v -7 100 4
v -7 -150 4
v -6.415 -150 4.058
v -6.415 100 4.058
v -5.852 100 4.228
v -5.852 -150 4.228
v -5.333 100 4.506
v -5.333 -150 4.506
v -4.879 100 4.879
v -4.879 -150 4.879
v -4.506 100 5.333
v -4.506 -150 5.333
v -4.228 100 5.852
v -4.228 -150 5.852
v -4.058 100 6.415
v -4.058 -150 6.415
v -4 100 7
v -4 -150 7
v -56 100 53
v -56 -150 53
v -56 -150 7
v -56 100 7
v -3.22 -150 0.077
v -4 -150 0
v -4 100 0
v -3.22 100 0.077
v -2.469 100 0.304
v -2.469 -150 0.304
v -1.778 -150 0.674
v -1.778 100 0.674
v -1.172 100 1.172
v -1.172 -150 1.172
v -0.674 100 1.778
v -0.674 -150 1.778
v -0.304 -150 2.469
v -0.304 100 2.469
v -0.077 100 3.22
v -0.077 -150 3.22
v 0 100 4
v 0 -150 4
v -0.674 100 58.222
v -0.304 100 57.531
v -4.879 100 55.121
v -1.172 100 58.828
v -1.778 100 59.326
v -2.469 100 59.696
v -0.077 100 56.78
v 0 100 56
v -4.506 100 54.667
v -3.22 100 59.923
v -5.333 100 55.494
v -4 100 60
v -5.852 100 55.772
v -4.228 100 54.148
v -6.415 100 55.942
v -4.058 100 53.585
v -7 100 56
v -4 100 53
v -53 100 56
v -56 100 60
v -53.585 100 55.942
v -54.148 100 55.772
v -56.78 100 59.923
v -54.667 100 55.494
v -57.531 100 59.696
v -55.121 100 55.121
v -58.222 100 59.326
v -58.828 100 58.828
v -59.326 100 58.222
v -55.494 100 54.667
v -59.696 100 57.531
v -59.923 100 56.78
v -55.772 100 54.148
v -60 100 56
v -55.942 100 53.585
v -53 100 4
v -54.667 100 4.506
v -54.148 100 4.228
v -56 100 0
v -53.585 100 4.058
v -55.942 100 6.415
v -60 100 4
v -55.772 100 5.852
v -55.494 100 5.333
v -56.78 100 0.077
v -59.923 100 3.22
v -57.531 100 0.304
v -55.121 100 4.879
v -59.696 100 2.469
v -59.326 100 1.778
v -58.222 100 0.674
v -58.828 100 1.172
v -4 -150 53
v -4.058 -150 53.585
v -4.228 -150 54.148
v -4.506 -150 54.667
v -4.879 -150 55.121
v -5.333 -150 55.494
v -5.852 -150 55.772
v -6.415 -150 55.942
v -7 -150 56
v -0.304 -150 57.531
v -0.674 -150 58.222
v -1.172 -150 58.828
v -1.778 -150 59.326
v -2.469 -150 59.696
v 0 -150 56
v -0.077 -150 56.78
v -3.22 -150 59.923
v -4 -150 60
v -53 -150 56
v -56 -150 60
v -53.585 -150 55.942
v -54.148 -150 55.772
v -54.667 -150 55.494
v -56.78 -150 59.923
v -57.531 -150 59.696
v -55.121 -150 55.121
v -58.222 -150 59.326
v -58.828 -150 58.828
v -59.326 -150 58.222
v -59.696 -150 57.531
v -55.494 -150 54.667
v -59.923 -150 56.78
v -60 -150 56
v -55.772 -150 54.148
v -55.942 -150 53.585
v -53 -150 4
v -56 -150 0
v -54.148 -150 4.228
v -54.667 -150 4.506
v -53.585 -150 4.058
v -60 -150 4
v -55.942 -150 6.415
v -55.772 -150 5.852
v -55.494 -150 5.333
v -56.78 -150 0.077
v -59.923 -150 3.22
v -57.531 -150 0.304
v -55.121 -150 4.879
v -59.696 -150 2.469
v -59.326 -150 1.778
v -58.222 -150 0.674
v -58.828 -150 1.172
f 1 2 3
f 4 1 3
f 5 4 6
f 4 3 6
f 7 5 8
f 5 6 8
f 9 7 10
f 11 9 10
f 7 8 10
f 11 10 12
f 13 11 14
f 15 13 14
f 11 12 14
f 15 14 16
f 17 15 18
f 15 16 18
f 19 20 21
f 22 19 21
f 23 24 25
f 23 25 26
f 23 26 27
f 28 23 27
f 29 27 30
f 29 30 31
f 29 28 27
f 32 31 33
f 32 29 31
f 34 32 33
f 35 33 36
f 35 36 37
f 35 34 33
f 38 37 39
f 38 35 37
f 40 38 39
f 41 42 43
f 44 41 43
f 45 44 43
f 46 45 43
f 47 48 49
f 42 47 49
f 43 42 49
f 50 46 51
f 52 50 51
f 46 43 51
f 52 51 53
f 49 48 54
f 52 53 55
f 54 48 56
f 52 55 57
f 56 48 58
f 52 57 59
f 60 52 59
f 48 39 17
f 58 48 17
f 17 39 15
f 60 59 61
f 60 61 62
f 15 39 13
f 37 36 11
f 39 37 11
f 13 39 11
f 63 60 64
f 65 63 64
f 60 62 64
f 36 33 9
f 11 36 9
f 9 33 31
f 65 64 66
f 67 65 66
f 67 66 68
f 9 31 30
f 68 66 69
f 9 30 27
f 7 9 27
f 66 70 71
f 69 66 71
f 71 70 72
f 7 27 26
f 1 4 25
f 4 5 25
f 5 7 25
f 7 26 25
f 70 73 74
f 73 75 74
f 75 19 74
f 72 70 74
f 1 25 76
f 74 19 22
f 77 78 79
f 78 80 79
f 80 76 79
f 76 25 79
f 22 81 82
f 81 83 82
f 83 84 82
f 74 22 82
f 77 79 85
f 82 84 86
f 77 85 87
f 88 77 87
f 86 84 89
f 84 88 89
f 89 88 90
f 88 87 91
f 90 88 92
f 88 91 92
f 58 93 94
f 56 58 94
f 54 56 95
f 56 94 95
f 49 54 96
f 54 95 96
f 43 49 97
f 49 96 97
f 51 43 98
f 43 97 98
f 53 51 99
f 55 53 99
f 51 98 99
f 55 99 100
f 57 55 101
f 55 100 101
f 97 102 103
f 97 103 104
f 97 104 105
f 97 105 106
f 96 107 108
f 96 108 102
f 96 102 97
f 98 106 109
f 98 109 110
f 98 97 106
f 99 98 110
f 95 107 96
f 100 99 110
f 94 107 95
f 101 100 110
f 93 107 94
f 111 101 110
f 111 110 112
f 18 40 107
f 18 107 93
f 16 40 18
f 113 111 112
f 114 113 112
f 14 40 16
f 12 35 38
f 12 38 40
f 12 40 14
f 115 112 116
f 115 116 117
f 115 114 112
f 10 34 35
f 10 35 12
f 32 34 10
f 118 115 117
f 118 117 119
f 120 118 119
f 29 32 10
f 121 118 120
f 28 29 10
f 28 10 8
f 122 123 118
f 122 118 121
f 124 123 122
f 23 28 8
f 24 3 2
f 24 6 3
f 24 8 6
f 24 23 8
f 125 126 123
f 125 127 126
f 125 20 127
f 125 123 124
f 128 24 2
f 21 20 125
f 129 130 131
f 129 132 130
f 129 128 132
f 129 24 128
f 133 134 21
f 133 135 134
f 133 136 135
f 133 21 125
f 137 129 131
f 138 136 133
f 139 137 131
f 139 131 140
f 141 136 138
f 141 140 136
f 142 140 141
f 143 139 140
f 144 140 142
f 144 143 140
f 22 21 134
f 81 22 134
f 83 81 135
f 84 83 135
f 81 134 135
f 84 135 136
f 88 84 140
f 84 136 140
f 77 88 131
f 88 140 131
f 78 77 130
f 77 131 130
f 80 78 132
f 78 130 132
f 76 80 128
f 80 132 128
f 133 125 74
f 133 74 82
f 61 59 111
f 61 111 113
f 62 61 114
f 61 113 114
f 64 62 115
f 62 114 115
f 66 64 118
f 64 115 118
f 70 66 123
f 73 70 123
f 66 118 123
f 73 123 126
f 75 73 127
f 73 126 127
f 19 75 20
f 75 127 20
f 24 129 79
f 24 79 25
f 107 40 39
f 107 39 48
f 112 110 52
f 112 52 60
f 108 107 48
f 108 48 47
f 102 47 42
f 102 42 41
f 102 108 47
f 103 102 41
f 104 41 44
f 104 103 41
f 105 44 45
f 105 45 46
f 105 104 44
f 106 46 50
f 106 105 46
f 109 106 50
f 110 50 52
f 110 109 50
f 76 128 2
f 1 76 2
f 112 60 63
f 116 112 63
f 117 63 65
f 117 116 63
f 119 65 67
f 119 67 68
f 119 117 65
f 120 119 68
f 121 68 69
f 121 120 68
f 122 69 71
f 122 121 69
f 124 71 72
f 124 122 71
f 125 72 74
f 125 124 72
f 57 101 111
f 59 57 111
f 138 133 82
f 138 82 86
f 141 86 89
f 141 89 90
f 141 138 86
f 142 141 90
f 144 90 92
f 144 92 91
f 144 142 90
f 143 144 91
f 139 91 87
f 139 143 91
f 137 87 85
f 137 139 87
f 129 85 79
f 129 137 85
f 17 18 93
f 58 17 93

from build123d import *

# Parameters (mm, degrees)
EXTRUDE_1_DEPTH      = 100
EXTRUDE_1_DEPTH_BACK = 150


with BuildPart() as part:
    # Эскиз1 → Бобышка-Вытянуть1 (new, two sides: drawn at the far end of the back side and taken through both)
    with BuildSketch(Plane(origin=(0, 0, 0), x_dir=(1, 0, 0), z_dir=(0, 1, 0)).offset(-EXTRUDE_1_DEPTH_BACK)):
        with BuildLine():
            Line((-56, 0), (-4, 0))
            ThreePointArc((-4, 0), (-1.171572875, -1.171572875), (0, -4))
            Line((0, -4), (0, -56))
            ThreePointArc((0, -56), (-1.171572875, -58.828427125), (-4, -60))
            Line((-4, -60), (-56, -60))
            ThreePointArc((-56, -60), (-58.828427125, -58.828427125), (-60, -56))
            Line((-60, -56), (-60, -4))
            ThreePointArc((-60, -4), (-58.828427125, -1.171572875), (-56, 0))
        make_face()
        with BuildLine():
            Line((-53, -4), (-7, -4))
            ThreePointArc((-7, -4), (-4.878679656, -4.878679656), (-4, -7))
            Line((-4, -7), (-4, -53))
            ThreePointArc((-4, -53), (-4.878679656, -55.121320344), (-7, -56))
            Line((-7, -56), (-53, -56))
            ThreePointArc((-53, -56), (-55.121320344, -55.121320344), (-56, -53))
            Line((-56, -53), (-56, -7))
            ThreePointArc((-56, -7), (-55.121320344, -4.878679656), (-53, -4))
        make_face(mode=Mode.SUBTRACT)
    extrude(amount=EXTRUDE_1_DEPTH + EXTRUDE_1_DEPTH_BACK)


solid = part.part
